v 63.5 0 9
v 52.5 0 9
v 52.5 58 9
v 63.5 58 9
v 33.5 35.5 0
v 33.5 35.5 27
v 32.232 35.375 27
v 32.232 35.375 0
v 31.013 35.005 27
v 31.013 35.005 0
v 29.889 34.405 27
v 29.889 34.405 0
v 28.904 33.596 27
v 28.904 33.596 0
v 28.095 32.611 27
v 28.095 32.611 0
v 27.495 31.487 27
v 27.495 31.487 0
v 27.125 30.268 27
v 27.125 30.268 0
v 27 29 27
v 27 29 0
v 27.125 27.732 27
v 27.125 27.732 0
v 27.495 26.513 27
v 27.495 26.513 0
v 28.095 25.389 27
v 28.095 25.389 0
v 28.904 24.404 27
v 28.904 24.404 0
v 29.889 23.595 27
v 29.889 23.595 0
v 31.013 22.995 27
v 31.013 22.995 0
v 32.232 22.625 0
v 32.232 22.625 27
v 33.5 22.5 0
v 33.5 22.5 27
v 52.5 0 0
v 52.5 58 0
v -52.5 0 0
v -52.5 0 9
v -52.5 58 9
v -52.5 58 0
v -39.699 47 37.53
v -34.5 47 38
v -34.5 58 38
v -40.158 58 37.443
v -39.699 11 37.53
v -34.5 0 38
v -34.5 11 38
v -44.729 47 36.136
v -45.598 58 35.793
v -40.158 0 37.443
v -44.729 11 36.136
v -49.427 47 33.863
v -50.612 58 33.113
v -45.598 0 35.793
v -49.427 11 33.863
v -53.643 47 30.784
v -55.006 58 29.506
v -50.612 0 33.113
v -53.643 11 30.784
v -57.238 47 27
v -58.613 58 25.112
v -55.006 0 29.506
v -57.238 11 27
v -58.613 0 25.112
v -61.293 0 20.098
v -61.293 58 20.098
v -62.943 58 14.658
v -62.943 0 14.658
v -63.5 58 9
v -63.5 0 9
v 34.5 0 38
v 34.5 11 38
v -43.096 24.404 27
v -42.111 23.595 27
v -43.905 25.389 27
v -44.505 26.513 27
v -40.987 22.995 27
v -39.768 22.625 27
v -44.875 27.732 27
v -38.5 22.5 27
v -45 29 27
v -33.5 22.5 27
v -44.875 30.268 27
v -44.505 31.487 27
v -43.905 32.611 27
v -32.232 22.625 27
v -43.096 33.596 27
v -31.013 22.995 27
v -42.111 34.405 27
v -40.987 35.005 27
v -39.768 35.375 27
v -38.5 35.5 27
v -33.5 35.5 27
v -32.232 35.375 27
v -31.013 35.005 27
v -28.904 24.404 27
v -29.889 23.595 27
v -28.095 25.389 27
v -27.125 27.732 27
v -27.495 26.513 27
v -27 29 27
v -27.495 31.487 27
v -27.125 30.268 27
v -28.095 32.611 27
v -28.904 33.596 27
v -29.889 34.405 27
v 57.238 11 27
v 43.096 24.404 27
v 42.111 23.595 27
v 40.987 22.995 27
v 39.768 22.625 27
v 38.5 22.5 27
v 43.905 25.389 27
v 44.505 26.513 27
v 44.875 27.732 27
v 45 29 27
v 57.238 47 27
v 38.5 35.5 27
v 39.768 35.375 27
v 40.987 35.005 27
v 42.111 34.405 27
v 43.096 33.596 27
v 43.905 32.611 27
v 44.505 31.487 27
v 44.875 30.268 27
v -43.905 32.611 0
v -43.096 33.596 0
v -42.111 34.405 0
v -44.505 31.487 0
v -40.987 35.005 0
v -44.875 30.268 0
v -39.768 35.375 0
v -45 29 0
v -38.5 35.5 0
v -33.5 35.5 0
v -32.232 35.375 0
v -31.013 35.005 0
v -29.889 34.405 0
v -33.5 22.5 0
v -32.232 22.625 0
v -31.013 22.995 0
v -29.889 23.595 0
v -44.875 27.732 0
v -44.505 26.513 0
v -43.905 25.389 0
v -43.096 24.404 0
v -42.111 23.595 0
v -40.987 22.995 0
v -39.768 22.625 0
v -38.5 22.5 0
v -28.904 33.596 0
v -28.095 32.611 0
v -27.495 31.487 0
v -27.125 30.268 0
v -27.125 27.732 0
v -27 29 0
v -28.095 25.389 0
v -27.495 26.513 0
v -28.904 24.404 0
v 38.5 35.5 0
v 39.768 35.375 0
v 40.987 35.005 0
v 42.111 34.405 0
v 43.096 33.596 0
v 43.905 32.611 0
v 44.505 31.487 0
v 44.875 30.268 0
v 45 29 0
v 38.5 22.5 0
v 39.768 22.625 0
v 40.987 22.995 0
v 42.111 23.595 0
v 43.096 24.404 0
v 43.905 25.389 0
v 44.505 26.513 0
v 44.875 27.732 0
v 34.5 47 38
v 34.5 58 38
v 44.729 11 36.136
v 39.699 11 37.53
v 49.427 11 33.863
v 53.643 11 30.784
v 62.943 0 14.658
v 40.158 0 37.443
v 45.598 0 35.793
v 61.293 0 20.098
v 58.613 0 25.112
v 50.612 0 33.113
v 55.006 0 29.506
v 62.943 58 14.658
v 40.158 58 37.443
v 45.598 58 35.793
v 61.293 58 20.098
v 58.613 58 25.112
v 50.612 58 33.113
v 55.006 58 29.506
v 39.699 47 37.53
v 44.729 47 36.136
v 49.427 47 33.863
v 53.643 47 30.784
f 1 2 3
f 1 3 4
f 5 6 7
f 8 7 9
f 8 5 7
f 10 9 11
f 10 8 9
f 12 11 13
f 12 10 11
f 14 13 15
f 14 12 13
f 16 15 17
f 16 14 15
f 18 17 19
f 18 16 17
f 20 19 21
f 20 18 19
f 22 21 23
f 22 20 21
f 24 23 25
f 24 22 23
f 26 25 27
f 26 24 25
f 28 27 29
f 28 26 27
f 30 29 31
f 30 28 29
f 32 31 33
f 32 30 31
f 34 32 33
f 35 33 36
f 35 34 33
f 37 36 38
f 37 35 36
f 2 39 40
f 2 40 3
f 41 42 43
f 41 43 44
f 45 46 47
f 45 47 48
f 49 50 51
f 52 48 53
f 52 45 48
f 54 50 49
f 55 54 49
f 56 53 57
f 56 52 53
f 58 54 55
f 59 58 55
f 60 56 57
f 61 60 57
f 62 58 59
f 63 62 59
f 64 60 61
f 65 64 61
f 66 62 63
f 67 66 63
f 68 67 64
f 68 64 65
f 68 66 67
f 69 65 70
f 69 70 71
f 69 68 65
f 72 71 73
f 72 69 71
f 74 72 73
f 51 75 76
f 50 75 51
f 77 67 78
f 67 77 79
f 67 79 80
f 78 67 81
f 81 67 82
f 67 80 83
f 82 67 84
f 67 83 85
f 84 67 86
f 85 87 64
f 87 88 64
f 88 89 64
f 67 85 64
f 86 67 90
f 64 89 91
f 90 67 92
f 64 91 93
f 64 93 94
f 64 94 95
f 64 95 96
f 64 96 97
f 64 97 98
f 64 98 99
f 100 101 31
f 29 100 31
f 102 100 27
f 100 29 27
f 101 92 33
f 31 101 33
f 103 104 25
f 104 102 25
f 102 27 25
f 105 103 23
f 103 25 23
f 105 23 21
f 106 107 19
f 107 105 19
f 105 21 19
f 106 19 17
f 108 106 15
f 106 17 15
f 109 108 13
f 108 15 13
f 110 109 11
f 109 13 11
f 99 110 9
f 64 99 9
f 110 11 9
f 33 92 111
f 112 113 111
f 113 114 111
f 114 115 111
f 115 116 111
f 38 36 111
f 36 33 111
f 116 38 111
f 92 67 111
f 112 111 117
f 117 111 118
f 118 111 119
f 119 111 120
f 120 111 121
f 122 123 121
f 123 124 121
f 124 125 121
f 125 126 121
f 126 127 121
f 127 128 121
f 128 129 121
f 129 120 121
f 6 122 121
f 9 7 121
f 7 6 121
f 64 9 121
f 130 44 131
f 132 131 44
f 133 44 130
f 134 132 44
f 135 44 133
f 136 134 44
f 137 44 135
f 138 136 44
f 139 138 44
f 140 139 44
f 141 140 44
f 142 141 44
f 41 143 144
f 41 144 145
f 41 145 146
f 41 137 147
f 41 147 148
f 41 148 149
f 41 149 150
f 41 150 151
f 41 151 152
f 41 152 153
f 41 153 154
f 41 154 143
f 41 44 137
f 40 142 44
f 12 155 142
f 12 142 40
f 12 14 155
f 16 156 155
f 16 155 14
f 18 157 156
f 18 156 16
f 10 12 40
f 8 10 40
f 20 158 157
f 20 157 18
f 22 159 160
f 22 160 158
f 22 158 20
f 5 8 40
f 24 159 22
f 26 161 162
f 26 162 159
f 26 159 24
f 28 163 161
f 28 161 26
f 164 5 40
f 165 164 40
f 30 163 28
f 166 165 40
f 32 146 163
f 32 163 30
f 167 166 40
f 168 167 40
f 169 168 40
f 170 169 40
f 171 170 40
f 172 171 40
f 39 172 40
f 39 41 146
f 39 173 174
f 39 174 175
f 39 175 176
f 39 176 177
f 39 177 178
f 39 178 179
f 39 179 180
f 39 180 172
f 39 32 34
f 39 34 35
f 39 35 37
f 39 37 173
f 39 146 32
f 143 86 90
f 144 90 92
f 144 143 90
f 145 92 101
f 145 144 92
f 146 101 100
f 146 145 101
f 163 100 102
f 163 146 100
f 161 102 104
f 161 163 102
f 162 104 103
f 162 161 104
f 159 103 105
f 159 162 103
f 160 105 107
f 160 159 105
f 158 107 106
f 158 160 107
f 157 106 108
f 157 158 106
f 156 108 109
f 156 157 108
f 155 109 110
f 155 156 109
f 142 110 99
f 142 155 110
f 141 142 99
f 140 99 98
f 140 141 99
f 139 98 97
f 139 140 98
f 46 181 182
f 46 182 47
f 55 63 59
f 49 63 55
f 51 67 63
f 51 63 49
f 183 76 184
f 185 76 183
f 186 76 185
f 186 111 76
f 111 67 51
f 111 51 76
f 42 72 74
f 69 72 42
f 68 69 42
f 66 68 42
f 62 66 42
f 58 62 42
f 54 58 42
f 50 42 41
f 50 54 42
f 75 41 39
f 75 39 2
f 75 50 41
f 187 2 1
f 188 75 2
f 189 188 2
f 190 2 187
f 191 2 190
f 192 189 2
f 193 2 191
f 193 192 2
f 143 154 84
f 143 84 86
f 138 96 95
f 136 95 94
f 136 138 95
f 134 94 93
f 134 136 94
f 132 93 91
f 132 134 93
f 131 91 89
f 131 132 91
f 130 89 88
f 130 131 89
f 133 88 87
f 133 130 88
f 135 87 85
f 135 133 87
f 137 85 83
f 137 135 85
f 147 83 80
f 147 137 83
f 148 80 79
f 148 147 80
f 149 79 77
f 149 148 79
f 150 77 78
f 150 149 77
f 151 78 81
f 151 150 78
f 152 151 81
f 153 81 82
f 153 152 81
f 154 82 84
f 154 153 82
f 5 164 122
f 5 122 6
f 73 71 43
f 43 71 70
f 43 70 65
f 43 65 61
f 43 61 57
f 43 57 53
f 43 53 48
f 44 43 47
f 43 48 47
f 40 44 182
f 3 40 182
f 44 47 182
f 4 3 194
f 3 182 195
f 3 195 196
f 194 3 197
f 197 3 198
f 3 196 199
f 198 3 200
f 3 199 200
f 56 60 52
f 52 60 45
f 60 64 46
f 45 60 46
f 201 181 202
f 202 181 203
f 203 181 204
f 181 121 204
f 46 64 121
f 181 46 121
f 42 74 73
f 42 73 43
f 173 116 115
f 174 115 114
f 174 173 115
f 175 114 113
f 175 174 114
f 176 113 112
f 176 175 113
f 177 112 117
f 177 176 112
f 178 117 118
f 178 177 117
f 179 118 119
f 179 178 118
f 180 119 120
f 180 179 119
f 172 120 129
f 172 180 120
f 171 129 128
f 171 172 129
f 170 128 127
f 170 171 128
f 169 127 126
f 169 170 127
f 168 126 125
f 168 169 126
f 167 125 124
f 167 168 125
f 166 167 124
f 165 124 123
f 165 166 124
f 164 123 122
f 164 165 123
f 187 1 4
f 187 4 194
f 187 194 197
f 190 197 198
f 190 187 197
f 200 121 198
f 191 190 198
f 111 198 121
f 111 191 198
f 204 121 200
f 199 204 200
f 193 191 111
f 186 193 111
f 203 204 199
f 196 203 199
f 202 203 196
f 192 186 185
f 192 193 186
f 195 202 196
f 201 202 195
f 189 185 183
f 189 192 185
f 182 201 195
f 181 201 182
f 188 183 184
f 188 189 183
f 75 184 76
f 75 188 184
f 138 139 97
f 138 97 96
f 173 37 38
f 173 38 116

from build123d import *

# Parameters (mm, degrees)
F1_DEPTH      = 58
F2_W          = 36
F2_H          = 11
F3_DEPTH      = 63.501
F3_DEPTH_BACK = 63.501
F5_DEPTH      = 38.001


with BuildPart() as f1:
    # F0 (on Front) → F1 (new body)
    with BuildSketch(Plane.XZ):
        with BuildLine():
            Line((-52.5, 9), (-52.5, 0))
            Line((-52.5, 0), (52.5, 0))
            Line((52.5, 0), (52.5, 9))
            Line((52.5, 9), (63.5, 9))
            ThreePointArc((63.5, 9), (55.0060966544, 29.5060966544), (34.5, 38))
            Line((34.5, 38), (-34.5, 38))
            ThreePointArc((-34.5, 38), (-55.0060966544, 29.5060966544), (-63.5, 9))
            Line((-63.5, 9), (-52.5, 9))
        make_face()
    extrude(amount=-F1_DEPTH)

    # F2 (on Right) → F3 (cut, two sides)
    with BuildSketch(Plane.YZ) as f3_sk:
        with Locations((29, 32.5)):
            Rectangle(F2_W, F2_H)
    extrude(amount=-F3_DEPTH, mode=Mode.SUBTRACT)
    extrude(f3_sk.sketch, amount=F3_DEPTH_BACK, mode=Mode.SUBTRACT)

    # F4 (on Top) → F5 (cut, through all)
    with BuildSketch(Plane.XY):
        with BuildLine():
            Line((-33.5, 35.5), (-38.5, 35.5))
            ThreePointArc((-38.5, 35.5), (-45, 29), (-38.5, 22.5))
            Line((-38.5, 22.5), (-33.5, 22.5))
            ThreePointArc((-33.5, 22.5), (-27, 29), (-33.5, 35.5))
        make_face()
        with BuildLine():
            Line((38.5, 35.5), (33.5, 35.5))
            ThreePointArc((33.5, 35.5), (27, 29), (33.5, 22.5))
            Line((33.5, 22.5), (38.5, 22.5))
            ThreePointArc((38.5, 22.5), (45, 29), (38.5, 35.5))
        make_face()
    extrude(amount=F5_DEPTH, mode=Mode.SUBTRACT)


solid = f1.part
